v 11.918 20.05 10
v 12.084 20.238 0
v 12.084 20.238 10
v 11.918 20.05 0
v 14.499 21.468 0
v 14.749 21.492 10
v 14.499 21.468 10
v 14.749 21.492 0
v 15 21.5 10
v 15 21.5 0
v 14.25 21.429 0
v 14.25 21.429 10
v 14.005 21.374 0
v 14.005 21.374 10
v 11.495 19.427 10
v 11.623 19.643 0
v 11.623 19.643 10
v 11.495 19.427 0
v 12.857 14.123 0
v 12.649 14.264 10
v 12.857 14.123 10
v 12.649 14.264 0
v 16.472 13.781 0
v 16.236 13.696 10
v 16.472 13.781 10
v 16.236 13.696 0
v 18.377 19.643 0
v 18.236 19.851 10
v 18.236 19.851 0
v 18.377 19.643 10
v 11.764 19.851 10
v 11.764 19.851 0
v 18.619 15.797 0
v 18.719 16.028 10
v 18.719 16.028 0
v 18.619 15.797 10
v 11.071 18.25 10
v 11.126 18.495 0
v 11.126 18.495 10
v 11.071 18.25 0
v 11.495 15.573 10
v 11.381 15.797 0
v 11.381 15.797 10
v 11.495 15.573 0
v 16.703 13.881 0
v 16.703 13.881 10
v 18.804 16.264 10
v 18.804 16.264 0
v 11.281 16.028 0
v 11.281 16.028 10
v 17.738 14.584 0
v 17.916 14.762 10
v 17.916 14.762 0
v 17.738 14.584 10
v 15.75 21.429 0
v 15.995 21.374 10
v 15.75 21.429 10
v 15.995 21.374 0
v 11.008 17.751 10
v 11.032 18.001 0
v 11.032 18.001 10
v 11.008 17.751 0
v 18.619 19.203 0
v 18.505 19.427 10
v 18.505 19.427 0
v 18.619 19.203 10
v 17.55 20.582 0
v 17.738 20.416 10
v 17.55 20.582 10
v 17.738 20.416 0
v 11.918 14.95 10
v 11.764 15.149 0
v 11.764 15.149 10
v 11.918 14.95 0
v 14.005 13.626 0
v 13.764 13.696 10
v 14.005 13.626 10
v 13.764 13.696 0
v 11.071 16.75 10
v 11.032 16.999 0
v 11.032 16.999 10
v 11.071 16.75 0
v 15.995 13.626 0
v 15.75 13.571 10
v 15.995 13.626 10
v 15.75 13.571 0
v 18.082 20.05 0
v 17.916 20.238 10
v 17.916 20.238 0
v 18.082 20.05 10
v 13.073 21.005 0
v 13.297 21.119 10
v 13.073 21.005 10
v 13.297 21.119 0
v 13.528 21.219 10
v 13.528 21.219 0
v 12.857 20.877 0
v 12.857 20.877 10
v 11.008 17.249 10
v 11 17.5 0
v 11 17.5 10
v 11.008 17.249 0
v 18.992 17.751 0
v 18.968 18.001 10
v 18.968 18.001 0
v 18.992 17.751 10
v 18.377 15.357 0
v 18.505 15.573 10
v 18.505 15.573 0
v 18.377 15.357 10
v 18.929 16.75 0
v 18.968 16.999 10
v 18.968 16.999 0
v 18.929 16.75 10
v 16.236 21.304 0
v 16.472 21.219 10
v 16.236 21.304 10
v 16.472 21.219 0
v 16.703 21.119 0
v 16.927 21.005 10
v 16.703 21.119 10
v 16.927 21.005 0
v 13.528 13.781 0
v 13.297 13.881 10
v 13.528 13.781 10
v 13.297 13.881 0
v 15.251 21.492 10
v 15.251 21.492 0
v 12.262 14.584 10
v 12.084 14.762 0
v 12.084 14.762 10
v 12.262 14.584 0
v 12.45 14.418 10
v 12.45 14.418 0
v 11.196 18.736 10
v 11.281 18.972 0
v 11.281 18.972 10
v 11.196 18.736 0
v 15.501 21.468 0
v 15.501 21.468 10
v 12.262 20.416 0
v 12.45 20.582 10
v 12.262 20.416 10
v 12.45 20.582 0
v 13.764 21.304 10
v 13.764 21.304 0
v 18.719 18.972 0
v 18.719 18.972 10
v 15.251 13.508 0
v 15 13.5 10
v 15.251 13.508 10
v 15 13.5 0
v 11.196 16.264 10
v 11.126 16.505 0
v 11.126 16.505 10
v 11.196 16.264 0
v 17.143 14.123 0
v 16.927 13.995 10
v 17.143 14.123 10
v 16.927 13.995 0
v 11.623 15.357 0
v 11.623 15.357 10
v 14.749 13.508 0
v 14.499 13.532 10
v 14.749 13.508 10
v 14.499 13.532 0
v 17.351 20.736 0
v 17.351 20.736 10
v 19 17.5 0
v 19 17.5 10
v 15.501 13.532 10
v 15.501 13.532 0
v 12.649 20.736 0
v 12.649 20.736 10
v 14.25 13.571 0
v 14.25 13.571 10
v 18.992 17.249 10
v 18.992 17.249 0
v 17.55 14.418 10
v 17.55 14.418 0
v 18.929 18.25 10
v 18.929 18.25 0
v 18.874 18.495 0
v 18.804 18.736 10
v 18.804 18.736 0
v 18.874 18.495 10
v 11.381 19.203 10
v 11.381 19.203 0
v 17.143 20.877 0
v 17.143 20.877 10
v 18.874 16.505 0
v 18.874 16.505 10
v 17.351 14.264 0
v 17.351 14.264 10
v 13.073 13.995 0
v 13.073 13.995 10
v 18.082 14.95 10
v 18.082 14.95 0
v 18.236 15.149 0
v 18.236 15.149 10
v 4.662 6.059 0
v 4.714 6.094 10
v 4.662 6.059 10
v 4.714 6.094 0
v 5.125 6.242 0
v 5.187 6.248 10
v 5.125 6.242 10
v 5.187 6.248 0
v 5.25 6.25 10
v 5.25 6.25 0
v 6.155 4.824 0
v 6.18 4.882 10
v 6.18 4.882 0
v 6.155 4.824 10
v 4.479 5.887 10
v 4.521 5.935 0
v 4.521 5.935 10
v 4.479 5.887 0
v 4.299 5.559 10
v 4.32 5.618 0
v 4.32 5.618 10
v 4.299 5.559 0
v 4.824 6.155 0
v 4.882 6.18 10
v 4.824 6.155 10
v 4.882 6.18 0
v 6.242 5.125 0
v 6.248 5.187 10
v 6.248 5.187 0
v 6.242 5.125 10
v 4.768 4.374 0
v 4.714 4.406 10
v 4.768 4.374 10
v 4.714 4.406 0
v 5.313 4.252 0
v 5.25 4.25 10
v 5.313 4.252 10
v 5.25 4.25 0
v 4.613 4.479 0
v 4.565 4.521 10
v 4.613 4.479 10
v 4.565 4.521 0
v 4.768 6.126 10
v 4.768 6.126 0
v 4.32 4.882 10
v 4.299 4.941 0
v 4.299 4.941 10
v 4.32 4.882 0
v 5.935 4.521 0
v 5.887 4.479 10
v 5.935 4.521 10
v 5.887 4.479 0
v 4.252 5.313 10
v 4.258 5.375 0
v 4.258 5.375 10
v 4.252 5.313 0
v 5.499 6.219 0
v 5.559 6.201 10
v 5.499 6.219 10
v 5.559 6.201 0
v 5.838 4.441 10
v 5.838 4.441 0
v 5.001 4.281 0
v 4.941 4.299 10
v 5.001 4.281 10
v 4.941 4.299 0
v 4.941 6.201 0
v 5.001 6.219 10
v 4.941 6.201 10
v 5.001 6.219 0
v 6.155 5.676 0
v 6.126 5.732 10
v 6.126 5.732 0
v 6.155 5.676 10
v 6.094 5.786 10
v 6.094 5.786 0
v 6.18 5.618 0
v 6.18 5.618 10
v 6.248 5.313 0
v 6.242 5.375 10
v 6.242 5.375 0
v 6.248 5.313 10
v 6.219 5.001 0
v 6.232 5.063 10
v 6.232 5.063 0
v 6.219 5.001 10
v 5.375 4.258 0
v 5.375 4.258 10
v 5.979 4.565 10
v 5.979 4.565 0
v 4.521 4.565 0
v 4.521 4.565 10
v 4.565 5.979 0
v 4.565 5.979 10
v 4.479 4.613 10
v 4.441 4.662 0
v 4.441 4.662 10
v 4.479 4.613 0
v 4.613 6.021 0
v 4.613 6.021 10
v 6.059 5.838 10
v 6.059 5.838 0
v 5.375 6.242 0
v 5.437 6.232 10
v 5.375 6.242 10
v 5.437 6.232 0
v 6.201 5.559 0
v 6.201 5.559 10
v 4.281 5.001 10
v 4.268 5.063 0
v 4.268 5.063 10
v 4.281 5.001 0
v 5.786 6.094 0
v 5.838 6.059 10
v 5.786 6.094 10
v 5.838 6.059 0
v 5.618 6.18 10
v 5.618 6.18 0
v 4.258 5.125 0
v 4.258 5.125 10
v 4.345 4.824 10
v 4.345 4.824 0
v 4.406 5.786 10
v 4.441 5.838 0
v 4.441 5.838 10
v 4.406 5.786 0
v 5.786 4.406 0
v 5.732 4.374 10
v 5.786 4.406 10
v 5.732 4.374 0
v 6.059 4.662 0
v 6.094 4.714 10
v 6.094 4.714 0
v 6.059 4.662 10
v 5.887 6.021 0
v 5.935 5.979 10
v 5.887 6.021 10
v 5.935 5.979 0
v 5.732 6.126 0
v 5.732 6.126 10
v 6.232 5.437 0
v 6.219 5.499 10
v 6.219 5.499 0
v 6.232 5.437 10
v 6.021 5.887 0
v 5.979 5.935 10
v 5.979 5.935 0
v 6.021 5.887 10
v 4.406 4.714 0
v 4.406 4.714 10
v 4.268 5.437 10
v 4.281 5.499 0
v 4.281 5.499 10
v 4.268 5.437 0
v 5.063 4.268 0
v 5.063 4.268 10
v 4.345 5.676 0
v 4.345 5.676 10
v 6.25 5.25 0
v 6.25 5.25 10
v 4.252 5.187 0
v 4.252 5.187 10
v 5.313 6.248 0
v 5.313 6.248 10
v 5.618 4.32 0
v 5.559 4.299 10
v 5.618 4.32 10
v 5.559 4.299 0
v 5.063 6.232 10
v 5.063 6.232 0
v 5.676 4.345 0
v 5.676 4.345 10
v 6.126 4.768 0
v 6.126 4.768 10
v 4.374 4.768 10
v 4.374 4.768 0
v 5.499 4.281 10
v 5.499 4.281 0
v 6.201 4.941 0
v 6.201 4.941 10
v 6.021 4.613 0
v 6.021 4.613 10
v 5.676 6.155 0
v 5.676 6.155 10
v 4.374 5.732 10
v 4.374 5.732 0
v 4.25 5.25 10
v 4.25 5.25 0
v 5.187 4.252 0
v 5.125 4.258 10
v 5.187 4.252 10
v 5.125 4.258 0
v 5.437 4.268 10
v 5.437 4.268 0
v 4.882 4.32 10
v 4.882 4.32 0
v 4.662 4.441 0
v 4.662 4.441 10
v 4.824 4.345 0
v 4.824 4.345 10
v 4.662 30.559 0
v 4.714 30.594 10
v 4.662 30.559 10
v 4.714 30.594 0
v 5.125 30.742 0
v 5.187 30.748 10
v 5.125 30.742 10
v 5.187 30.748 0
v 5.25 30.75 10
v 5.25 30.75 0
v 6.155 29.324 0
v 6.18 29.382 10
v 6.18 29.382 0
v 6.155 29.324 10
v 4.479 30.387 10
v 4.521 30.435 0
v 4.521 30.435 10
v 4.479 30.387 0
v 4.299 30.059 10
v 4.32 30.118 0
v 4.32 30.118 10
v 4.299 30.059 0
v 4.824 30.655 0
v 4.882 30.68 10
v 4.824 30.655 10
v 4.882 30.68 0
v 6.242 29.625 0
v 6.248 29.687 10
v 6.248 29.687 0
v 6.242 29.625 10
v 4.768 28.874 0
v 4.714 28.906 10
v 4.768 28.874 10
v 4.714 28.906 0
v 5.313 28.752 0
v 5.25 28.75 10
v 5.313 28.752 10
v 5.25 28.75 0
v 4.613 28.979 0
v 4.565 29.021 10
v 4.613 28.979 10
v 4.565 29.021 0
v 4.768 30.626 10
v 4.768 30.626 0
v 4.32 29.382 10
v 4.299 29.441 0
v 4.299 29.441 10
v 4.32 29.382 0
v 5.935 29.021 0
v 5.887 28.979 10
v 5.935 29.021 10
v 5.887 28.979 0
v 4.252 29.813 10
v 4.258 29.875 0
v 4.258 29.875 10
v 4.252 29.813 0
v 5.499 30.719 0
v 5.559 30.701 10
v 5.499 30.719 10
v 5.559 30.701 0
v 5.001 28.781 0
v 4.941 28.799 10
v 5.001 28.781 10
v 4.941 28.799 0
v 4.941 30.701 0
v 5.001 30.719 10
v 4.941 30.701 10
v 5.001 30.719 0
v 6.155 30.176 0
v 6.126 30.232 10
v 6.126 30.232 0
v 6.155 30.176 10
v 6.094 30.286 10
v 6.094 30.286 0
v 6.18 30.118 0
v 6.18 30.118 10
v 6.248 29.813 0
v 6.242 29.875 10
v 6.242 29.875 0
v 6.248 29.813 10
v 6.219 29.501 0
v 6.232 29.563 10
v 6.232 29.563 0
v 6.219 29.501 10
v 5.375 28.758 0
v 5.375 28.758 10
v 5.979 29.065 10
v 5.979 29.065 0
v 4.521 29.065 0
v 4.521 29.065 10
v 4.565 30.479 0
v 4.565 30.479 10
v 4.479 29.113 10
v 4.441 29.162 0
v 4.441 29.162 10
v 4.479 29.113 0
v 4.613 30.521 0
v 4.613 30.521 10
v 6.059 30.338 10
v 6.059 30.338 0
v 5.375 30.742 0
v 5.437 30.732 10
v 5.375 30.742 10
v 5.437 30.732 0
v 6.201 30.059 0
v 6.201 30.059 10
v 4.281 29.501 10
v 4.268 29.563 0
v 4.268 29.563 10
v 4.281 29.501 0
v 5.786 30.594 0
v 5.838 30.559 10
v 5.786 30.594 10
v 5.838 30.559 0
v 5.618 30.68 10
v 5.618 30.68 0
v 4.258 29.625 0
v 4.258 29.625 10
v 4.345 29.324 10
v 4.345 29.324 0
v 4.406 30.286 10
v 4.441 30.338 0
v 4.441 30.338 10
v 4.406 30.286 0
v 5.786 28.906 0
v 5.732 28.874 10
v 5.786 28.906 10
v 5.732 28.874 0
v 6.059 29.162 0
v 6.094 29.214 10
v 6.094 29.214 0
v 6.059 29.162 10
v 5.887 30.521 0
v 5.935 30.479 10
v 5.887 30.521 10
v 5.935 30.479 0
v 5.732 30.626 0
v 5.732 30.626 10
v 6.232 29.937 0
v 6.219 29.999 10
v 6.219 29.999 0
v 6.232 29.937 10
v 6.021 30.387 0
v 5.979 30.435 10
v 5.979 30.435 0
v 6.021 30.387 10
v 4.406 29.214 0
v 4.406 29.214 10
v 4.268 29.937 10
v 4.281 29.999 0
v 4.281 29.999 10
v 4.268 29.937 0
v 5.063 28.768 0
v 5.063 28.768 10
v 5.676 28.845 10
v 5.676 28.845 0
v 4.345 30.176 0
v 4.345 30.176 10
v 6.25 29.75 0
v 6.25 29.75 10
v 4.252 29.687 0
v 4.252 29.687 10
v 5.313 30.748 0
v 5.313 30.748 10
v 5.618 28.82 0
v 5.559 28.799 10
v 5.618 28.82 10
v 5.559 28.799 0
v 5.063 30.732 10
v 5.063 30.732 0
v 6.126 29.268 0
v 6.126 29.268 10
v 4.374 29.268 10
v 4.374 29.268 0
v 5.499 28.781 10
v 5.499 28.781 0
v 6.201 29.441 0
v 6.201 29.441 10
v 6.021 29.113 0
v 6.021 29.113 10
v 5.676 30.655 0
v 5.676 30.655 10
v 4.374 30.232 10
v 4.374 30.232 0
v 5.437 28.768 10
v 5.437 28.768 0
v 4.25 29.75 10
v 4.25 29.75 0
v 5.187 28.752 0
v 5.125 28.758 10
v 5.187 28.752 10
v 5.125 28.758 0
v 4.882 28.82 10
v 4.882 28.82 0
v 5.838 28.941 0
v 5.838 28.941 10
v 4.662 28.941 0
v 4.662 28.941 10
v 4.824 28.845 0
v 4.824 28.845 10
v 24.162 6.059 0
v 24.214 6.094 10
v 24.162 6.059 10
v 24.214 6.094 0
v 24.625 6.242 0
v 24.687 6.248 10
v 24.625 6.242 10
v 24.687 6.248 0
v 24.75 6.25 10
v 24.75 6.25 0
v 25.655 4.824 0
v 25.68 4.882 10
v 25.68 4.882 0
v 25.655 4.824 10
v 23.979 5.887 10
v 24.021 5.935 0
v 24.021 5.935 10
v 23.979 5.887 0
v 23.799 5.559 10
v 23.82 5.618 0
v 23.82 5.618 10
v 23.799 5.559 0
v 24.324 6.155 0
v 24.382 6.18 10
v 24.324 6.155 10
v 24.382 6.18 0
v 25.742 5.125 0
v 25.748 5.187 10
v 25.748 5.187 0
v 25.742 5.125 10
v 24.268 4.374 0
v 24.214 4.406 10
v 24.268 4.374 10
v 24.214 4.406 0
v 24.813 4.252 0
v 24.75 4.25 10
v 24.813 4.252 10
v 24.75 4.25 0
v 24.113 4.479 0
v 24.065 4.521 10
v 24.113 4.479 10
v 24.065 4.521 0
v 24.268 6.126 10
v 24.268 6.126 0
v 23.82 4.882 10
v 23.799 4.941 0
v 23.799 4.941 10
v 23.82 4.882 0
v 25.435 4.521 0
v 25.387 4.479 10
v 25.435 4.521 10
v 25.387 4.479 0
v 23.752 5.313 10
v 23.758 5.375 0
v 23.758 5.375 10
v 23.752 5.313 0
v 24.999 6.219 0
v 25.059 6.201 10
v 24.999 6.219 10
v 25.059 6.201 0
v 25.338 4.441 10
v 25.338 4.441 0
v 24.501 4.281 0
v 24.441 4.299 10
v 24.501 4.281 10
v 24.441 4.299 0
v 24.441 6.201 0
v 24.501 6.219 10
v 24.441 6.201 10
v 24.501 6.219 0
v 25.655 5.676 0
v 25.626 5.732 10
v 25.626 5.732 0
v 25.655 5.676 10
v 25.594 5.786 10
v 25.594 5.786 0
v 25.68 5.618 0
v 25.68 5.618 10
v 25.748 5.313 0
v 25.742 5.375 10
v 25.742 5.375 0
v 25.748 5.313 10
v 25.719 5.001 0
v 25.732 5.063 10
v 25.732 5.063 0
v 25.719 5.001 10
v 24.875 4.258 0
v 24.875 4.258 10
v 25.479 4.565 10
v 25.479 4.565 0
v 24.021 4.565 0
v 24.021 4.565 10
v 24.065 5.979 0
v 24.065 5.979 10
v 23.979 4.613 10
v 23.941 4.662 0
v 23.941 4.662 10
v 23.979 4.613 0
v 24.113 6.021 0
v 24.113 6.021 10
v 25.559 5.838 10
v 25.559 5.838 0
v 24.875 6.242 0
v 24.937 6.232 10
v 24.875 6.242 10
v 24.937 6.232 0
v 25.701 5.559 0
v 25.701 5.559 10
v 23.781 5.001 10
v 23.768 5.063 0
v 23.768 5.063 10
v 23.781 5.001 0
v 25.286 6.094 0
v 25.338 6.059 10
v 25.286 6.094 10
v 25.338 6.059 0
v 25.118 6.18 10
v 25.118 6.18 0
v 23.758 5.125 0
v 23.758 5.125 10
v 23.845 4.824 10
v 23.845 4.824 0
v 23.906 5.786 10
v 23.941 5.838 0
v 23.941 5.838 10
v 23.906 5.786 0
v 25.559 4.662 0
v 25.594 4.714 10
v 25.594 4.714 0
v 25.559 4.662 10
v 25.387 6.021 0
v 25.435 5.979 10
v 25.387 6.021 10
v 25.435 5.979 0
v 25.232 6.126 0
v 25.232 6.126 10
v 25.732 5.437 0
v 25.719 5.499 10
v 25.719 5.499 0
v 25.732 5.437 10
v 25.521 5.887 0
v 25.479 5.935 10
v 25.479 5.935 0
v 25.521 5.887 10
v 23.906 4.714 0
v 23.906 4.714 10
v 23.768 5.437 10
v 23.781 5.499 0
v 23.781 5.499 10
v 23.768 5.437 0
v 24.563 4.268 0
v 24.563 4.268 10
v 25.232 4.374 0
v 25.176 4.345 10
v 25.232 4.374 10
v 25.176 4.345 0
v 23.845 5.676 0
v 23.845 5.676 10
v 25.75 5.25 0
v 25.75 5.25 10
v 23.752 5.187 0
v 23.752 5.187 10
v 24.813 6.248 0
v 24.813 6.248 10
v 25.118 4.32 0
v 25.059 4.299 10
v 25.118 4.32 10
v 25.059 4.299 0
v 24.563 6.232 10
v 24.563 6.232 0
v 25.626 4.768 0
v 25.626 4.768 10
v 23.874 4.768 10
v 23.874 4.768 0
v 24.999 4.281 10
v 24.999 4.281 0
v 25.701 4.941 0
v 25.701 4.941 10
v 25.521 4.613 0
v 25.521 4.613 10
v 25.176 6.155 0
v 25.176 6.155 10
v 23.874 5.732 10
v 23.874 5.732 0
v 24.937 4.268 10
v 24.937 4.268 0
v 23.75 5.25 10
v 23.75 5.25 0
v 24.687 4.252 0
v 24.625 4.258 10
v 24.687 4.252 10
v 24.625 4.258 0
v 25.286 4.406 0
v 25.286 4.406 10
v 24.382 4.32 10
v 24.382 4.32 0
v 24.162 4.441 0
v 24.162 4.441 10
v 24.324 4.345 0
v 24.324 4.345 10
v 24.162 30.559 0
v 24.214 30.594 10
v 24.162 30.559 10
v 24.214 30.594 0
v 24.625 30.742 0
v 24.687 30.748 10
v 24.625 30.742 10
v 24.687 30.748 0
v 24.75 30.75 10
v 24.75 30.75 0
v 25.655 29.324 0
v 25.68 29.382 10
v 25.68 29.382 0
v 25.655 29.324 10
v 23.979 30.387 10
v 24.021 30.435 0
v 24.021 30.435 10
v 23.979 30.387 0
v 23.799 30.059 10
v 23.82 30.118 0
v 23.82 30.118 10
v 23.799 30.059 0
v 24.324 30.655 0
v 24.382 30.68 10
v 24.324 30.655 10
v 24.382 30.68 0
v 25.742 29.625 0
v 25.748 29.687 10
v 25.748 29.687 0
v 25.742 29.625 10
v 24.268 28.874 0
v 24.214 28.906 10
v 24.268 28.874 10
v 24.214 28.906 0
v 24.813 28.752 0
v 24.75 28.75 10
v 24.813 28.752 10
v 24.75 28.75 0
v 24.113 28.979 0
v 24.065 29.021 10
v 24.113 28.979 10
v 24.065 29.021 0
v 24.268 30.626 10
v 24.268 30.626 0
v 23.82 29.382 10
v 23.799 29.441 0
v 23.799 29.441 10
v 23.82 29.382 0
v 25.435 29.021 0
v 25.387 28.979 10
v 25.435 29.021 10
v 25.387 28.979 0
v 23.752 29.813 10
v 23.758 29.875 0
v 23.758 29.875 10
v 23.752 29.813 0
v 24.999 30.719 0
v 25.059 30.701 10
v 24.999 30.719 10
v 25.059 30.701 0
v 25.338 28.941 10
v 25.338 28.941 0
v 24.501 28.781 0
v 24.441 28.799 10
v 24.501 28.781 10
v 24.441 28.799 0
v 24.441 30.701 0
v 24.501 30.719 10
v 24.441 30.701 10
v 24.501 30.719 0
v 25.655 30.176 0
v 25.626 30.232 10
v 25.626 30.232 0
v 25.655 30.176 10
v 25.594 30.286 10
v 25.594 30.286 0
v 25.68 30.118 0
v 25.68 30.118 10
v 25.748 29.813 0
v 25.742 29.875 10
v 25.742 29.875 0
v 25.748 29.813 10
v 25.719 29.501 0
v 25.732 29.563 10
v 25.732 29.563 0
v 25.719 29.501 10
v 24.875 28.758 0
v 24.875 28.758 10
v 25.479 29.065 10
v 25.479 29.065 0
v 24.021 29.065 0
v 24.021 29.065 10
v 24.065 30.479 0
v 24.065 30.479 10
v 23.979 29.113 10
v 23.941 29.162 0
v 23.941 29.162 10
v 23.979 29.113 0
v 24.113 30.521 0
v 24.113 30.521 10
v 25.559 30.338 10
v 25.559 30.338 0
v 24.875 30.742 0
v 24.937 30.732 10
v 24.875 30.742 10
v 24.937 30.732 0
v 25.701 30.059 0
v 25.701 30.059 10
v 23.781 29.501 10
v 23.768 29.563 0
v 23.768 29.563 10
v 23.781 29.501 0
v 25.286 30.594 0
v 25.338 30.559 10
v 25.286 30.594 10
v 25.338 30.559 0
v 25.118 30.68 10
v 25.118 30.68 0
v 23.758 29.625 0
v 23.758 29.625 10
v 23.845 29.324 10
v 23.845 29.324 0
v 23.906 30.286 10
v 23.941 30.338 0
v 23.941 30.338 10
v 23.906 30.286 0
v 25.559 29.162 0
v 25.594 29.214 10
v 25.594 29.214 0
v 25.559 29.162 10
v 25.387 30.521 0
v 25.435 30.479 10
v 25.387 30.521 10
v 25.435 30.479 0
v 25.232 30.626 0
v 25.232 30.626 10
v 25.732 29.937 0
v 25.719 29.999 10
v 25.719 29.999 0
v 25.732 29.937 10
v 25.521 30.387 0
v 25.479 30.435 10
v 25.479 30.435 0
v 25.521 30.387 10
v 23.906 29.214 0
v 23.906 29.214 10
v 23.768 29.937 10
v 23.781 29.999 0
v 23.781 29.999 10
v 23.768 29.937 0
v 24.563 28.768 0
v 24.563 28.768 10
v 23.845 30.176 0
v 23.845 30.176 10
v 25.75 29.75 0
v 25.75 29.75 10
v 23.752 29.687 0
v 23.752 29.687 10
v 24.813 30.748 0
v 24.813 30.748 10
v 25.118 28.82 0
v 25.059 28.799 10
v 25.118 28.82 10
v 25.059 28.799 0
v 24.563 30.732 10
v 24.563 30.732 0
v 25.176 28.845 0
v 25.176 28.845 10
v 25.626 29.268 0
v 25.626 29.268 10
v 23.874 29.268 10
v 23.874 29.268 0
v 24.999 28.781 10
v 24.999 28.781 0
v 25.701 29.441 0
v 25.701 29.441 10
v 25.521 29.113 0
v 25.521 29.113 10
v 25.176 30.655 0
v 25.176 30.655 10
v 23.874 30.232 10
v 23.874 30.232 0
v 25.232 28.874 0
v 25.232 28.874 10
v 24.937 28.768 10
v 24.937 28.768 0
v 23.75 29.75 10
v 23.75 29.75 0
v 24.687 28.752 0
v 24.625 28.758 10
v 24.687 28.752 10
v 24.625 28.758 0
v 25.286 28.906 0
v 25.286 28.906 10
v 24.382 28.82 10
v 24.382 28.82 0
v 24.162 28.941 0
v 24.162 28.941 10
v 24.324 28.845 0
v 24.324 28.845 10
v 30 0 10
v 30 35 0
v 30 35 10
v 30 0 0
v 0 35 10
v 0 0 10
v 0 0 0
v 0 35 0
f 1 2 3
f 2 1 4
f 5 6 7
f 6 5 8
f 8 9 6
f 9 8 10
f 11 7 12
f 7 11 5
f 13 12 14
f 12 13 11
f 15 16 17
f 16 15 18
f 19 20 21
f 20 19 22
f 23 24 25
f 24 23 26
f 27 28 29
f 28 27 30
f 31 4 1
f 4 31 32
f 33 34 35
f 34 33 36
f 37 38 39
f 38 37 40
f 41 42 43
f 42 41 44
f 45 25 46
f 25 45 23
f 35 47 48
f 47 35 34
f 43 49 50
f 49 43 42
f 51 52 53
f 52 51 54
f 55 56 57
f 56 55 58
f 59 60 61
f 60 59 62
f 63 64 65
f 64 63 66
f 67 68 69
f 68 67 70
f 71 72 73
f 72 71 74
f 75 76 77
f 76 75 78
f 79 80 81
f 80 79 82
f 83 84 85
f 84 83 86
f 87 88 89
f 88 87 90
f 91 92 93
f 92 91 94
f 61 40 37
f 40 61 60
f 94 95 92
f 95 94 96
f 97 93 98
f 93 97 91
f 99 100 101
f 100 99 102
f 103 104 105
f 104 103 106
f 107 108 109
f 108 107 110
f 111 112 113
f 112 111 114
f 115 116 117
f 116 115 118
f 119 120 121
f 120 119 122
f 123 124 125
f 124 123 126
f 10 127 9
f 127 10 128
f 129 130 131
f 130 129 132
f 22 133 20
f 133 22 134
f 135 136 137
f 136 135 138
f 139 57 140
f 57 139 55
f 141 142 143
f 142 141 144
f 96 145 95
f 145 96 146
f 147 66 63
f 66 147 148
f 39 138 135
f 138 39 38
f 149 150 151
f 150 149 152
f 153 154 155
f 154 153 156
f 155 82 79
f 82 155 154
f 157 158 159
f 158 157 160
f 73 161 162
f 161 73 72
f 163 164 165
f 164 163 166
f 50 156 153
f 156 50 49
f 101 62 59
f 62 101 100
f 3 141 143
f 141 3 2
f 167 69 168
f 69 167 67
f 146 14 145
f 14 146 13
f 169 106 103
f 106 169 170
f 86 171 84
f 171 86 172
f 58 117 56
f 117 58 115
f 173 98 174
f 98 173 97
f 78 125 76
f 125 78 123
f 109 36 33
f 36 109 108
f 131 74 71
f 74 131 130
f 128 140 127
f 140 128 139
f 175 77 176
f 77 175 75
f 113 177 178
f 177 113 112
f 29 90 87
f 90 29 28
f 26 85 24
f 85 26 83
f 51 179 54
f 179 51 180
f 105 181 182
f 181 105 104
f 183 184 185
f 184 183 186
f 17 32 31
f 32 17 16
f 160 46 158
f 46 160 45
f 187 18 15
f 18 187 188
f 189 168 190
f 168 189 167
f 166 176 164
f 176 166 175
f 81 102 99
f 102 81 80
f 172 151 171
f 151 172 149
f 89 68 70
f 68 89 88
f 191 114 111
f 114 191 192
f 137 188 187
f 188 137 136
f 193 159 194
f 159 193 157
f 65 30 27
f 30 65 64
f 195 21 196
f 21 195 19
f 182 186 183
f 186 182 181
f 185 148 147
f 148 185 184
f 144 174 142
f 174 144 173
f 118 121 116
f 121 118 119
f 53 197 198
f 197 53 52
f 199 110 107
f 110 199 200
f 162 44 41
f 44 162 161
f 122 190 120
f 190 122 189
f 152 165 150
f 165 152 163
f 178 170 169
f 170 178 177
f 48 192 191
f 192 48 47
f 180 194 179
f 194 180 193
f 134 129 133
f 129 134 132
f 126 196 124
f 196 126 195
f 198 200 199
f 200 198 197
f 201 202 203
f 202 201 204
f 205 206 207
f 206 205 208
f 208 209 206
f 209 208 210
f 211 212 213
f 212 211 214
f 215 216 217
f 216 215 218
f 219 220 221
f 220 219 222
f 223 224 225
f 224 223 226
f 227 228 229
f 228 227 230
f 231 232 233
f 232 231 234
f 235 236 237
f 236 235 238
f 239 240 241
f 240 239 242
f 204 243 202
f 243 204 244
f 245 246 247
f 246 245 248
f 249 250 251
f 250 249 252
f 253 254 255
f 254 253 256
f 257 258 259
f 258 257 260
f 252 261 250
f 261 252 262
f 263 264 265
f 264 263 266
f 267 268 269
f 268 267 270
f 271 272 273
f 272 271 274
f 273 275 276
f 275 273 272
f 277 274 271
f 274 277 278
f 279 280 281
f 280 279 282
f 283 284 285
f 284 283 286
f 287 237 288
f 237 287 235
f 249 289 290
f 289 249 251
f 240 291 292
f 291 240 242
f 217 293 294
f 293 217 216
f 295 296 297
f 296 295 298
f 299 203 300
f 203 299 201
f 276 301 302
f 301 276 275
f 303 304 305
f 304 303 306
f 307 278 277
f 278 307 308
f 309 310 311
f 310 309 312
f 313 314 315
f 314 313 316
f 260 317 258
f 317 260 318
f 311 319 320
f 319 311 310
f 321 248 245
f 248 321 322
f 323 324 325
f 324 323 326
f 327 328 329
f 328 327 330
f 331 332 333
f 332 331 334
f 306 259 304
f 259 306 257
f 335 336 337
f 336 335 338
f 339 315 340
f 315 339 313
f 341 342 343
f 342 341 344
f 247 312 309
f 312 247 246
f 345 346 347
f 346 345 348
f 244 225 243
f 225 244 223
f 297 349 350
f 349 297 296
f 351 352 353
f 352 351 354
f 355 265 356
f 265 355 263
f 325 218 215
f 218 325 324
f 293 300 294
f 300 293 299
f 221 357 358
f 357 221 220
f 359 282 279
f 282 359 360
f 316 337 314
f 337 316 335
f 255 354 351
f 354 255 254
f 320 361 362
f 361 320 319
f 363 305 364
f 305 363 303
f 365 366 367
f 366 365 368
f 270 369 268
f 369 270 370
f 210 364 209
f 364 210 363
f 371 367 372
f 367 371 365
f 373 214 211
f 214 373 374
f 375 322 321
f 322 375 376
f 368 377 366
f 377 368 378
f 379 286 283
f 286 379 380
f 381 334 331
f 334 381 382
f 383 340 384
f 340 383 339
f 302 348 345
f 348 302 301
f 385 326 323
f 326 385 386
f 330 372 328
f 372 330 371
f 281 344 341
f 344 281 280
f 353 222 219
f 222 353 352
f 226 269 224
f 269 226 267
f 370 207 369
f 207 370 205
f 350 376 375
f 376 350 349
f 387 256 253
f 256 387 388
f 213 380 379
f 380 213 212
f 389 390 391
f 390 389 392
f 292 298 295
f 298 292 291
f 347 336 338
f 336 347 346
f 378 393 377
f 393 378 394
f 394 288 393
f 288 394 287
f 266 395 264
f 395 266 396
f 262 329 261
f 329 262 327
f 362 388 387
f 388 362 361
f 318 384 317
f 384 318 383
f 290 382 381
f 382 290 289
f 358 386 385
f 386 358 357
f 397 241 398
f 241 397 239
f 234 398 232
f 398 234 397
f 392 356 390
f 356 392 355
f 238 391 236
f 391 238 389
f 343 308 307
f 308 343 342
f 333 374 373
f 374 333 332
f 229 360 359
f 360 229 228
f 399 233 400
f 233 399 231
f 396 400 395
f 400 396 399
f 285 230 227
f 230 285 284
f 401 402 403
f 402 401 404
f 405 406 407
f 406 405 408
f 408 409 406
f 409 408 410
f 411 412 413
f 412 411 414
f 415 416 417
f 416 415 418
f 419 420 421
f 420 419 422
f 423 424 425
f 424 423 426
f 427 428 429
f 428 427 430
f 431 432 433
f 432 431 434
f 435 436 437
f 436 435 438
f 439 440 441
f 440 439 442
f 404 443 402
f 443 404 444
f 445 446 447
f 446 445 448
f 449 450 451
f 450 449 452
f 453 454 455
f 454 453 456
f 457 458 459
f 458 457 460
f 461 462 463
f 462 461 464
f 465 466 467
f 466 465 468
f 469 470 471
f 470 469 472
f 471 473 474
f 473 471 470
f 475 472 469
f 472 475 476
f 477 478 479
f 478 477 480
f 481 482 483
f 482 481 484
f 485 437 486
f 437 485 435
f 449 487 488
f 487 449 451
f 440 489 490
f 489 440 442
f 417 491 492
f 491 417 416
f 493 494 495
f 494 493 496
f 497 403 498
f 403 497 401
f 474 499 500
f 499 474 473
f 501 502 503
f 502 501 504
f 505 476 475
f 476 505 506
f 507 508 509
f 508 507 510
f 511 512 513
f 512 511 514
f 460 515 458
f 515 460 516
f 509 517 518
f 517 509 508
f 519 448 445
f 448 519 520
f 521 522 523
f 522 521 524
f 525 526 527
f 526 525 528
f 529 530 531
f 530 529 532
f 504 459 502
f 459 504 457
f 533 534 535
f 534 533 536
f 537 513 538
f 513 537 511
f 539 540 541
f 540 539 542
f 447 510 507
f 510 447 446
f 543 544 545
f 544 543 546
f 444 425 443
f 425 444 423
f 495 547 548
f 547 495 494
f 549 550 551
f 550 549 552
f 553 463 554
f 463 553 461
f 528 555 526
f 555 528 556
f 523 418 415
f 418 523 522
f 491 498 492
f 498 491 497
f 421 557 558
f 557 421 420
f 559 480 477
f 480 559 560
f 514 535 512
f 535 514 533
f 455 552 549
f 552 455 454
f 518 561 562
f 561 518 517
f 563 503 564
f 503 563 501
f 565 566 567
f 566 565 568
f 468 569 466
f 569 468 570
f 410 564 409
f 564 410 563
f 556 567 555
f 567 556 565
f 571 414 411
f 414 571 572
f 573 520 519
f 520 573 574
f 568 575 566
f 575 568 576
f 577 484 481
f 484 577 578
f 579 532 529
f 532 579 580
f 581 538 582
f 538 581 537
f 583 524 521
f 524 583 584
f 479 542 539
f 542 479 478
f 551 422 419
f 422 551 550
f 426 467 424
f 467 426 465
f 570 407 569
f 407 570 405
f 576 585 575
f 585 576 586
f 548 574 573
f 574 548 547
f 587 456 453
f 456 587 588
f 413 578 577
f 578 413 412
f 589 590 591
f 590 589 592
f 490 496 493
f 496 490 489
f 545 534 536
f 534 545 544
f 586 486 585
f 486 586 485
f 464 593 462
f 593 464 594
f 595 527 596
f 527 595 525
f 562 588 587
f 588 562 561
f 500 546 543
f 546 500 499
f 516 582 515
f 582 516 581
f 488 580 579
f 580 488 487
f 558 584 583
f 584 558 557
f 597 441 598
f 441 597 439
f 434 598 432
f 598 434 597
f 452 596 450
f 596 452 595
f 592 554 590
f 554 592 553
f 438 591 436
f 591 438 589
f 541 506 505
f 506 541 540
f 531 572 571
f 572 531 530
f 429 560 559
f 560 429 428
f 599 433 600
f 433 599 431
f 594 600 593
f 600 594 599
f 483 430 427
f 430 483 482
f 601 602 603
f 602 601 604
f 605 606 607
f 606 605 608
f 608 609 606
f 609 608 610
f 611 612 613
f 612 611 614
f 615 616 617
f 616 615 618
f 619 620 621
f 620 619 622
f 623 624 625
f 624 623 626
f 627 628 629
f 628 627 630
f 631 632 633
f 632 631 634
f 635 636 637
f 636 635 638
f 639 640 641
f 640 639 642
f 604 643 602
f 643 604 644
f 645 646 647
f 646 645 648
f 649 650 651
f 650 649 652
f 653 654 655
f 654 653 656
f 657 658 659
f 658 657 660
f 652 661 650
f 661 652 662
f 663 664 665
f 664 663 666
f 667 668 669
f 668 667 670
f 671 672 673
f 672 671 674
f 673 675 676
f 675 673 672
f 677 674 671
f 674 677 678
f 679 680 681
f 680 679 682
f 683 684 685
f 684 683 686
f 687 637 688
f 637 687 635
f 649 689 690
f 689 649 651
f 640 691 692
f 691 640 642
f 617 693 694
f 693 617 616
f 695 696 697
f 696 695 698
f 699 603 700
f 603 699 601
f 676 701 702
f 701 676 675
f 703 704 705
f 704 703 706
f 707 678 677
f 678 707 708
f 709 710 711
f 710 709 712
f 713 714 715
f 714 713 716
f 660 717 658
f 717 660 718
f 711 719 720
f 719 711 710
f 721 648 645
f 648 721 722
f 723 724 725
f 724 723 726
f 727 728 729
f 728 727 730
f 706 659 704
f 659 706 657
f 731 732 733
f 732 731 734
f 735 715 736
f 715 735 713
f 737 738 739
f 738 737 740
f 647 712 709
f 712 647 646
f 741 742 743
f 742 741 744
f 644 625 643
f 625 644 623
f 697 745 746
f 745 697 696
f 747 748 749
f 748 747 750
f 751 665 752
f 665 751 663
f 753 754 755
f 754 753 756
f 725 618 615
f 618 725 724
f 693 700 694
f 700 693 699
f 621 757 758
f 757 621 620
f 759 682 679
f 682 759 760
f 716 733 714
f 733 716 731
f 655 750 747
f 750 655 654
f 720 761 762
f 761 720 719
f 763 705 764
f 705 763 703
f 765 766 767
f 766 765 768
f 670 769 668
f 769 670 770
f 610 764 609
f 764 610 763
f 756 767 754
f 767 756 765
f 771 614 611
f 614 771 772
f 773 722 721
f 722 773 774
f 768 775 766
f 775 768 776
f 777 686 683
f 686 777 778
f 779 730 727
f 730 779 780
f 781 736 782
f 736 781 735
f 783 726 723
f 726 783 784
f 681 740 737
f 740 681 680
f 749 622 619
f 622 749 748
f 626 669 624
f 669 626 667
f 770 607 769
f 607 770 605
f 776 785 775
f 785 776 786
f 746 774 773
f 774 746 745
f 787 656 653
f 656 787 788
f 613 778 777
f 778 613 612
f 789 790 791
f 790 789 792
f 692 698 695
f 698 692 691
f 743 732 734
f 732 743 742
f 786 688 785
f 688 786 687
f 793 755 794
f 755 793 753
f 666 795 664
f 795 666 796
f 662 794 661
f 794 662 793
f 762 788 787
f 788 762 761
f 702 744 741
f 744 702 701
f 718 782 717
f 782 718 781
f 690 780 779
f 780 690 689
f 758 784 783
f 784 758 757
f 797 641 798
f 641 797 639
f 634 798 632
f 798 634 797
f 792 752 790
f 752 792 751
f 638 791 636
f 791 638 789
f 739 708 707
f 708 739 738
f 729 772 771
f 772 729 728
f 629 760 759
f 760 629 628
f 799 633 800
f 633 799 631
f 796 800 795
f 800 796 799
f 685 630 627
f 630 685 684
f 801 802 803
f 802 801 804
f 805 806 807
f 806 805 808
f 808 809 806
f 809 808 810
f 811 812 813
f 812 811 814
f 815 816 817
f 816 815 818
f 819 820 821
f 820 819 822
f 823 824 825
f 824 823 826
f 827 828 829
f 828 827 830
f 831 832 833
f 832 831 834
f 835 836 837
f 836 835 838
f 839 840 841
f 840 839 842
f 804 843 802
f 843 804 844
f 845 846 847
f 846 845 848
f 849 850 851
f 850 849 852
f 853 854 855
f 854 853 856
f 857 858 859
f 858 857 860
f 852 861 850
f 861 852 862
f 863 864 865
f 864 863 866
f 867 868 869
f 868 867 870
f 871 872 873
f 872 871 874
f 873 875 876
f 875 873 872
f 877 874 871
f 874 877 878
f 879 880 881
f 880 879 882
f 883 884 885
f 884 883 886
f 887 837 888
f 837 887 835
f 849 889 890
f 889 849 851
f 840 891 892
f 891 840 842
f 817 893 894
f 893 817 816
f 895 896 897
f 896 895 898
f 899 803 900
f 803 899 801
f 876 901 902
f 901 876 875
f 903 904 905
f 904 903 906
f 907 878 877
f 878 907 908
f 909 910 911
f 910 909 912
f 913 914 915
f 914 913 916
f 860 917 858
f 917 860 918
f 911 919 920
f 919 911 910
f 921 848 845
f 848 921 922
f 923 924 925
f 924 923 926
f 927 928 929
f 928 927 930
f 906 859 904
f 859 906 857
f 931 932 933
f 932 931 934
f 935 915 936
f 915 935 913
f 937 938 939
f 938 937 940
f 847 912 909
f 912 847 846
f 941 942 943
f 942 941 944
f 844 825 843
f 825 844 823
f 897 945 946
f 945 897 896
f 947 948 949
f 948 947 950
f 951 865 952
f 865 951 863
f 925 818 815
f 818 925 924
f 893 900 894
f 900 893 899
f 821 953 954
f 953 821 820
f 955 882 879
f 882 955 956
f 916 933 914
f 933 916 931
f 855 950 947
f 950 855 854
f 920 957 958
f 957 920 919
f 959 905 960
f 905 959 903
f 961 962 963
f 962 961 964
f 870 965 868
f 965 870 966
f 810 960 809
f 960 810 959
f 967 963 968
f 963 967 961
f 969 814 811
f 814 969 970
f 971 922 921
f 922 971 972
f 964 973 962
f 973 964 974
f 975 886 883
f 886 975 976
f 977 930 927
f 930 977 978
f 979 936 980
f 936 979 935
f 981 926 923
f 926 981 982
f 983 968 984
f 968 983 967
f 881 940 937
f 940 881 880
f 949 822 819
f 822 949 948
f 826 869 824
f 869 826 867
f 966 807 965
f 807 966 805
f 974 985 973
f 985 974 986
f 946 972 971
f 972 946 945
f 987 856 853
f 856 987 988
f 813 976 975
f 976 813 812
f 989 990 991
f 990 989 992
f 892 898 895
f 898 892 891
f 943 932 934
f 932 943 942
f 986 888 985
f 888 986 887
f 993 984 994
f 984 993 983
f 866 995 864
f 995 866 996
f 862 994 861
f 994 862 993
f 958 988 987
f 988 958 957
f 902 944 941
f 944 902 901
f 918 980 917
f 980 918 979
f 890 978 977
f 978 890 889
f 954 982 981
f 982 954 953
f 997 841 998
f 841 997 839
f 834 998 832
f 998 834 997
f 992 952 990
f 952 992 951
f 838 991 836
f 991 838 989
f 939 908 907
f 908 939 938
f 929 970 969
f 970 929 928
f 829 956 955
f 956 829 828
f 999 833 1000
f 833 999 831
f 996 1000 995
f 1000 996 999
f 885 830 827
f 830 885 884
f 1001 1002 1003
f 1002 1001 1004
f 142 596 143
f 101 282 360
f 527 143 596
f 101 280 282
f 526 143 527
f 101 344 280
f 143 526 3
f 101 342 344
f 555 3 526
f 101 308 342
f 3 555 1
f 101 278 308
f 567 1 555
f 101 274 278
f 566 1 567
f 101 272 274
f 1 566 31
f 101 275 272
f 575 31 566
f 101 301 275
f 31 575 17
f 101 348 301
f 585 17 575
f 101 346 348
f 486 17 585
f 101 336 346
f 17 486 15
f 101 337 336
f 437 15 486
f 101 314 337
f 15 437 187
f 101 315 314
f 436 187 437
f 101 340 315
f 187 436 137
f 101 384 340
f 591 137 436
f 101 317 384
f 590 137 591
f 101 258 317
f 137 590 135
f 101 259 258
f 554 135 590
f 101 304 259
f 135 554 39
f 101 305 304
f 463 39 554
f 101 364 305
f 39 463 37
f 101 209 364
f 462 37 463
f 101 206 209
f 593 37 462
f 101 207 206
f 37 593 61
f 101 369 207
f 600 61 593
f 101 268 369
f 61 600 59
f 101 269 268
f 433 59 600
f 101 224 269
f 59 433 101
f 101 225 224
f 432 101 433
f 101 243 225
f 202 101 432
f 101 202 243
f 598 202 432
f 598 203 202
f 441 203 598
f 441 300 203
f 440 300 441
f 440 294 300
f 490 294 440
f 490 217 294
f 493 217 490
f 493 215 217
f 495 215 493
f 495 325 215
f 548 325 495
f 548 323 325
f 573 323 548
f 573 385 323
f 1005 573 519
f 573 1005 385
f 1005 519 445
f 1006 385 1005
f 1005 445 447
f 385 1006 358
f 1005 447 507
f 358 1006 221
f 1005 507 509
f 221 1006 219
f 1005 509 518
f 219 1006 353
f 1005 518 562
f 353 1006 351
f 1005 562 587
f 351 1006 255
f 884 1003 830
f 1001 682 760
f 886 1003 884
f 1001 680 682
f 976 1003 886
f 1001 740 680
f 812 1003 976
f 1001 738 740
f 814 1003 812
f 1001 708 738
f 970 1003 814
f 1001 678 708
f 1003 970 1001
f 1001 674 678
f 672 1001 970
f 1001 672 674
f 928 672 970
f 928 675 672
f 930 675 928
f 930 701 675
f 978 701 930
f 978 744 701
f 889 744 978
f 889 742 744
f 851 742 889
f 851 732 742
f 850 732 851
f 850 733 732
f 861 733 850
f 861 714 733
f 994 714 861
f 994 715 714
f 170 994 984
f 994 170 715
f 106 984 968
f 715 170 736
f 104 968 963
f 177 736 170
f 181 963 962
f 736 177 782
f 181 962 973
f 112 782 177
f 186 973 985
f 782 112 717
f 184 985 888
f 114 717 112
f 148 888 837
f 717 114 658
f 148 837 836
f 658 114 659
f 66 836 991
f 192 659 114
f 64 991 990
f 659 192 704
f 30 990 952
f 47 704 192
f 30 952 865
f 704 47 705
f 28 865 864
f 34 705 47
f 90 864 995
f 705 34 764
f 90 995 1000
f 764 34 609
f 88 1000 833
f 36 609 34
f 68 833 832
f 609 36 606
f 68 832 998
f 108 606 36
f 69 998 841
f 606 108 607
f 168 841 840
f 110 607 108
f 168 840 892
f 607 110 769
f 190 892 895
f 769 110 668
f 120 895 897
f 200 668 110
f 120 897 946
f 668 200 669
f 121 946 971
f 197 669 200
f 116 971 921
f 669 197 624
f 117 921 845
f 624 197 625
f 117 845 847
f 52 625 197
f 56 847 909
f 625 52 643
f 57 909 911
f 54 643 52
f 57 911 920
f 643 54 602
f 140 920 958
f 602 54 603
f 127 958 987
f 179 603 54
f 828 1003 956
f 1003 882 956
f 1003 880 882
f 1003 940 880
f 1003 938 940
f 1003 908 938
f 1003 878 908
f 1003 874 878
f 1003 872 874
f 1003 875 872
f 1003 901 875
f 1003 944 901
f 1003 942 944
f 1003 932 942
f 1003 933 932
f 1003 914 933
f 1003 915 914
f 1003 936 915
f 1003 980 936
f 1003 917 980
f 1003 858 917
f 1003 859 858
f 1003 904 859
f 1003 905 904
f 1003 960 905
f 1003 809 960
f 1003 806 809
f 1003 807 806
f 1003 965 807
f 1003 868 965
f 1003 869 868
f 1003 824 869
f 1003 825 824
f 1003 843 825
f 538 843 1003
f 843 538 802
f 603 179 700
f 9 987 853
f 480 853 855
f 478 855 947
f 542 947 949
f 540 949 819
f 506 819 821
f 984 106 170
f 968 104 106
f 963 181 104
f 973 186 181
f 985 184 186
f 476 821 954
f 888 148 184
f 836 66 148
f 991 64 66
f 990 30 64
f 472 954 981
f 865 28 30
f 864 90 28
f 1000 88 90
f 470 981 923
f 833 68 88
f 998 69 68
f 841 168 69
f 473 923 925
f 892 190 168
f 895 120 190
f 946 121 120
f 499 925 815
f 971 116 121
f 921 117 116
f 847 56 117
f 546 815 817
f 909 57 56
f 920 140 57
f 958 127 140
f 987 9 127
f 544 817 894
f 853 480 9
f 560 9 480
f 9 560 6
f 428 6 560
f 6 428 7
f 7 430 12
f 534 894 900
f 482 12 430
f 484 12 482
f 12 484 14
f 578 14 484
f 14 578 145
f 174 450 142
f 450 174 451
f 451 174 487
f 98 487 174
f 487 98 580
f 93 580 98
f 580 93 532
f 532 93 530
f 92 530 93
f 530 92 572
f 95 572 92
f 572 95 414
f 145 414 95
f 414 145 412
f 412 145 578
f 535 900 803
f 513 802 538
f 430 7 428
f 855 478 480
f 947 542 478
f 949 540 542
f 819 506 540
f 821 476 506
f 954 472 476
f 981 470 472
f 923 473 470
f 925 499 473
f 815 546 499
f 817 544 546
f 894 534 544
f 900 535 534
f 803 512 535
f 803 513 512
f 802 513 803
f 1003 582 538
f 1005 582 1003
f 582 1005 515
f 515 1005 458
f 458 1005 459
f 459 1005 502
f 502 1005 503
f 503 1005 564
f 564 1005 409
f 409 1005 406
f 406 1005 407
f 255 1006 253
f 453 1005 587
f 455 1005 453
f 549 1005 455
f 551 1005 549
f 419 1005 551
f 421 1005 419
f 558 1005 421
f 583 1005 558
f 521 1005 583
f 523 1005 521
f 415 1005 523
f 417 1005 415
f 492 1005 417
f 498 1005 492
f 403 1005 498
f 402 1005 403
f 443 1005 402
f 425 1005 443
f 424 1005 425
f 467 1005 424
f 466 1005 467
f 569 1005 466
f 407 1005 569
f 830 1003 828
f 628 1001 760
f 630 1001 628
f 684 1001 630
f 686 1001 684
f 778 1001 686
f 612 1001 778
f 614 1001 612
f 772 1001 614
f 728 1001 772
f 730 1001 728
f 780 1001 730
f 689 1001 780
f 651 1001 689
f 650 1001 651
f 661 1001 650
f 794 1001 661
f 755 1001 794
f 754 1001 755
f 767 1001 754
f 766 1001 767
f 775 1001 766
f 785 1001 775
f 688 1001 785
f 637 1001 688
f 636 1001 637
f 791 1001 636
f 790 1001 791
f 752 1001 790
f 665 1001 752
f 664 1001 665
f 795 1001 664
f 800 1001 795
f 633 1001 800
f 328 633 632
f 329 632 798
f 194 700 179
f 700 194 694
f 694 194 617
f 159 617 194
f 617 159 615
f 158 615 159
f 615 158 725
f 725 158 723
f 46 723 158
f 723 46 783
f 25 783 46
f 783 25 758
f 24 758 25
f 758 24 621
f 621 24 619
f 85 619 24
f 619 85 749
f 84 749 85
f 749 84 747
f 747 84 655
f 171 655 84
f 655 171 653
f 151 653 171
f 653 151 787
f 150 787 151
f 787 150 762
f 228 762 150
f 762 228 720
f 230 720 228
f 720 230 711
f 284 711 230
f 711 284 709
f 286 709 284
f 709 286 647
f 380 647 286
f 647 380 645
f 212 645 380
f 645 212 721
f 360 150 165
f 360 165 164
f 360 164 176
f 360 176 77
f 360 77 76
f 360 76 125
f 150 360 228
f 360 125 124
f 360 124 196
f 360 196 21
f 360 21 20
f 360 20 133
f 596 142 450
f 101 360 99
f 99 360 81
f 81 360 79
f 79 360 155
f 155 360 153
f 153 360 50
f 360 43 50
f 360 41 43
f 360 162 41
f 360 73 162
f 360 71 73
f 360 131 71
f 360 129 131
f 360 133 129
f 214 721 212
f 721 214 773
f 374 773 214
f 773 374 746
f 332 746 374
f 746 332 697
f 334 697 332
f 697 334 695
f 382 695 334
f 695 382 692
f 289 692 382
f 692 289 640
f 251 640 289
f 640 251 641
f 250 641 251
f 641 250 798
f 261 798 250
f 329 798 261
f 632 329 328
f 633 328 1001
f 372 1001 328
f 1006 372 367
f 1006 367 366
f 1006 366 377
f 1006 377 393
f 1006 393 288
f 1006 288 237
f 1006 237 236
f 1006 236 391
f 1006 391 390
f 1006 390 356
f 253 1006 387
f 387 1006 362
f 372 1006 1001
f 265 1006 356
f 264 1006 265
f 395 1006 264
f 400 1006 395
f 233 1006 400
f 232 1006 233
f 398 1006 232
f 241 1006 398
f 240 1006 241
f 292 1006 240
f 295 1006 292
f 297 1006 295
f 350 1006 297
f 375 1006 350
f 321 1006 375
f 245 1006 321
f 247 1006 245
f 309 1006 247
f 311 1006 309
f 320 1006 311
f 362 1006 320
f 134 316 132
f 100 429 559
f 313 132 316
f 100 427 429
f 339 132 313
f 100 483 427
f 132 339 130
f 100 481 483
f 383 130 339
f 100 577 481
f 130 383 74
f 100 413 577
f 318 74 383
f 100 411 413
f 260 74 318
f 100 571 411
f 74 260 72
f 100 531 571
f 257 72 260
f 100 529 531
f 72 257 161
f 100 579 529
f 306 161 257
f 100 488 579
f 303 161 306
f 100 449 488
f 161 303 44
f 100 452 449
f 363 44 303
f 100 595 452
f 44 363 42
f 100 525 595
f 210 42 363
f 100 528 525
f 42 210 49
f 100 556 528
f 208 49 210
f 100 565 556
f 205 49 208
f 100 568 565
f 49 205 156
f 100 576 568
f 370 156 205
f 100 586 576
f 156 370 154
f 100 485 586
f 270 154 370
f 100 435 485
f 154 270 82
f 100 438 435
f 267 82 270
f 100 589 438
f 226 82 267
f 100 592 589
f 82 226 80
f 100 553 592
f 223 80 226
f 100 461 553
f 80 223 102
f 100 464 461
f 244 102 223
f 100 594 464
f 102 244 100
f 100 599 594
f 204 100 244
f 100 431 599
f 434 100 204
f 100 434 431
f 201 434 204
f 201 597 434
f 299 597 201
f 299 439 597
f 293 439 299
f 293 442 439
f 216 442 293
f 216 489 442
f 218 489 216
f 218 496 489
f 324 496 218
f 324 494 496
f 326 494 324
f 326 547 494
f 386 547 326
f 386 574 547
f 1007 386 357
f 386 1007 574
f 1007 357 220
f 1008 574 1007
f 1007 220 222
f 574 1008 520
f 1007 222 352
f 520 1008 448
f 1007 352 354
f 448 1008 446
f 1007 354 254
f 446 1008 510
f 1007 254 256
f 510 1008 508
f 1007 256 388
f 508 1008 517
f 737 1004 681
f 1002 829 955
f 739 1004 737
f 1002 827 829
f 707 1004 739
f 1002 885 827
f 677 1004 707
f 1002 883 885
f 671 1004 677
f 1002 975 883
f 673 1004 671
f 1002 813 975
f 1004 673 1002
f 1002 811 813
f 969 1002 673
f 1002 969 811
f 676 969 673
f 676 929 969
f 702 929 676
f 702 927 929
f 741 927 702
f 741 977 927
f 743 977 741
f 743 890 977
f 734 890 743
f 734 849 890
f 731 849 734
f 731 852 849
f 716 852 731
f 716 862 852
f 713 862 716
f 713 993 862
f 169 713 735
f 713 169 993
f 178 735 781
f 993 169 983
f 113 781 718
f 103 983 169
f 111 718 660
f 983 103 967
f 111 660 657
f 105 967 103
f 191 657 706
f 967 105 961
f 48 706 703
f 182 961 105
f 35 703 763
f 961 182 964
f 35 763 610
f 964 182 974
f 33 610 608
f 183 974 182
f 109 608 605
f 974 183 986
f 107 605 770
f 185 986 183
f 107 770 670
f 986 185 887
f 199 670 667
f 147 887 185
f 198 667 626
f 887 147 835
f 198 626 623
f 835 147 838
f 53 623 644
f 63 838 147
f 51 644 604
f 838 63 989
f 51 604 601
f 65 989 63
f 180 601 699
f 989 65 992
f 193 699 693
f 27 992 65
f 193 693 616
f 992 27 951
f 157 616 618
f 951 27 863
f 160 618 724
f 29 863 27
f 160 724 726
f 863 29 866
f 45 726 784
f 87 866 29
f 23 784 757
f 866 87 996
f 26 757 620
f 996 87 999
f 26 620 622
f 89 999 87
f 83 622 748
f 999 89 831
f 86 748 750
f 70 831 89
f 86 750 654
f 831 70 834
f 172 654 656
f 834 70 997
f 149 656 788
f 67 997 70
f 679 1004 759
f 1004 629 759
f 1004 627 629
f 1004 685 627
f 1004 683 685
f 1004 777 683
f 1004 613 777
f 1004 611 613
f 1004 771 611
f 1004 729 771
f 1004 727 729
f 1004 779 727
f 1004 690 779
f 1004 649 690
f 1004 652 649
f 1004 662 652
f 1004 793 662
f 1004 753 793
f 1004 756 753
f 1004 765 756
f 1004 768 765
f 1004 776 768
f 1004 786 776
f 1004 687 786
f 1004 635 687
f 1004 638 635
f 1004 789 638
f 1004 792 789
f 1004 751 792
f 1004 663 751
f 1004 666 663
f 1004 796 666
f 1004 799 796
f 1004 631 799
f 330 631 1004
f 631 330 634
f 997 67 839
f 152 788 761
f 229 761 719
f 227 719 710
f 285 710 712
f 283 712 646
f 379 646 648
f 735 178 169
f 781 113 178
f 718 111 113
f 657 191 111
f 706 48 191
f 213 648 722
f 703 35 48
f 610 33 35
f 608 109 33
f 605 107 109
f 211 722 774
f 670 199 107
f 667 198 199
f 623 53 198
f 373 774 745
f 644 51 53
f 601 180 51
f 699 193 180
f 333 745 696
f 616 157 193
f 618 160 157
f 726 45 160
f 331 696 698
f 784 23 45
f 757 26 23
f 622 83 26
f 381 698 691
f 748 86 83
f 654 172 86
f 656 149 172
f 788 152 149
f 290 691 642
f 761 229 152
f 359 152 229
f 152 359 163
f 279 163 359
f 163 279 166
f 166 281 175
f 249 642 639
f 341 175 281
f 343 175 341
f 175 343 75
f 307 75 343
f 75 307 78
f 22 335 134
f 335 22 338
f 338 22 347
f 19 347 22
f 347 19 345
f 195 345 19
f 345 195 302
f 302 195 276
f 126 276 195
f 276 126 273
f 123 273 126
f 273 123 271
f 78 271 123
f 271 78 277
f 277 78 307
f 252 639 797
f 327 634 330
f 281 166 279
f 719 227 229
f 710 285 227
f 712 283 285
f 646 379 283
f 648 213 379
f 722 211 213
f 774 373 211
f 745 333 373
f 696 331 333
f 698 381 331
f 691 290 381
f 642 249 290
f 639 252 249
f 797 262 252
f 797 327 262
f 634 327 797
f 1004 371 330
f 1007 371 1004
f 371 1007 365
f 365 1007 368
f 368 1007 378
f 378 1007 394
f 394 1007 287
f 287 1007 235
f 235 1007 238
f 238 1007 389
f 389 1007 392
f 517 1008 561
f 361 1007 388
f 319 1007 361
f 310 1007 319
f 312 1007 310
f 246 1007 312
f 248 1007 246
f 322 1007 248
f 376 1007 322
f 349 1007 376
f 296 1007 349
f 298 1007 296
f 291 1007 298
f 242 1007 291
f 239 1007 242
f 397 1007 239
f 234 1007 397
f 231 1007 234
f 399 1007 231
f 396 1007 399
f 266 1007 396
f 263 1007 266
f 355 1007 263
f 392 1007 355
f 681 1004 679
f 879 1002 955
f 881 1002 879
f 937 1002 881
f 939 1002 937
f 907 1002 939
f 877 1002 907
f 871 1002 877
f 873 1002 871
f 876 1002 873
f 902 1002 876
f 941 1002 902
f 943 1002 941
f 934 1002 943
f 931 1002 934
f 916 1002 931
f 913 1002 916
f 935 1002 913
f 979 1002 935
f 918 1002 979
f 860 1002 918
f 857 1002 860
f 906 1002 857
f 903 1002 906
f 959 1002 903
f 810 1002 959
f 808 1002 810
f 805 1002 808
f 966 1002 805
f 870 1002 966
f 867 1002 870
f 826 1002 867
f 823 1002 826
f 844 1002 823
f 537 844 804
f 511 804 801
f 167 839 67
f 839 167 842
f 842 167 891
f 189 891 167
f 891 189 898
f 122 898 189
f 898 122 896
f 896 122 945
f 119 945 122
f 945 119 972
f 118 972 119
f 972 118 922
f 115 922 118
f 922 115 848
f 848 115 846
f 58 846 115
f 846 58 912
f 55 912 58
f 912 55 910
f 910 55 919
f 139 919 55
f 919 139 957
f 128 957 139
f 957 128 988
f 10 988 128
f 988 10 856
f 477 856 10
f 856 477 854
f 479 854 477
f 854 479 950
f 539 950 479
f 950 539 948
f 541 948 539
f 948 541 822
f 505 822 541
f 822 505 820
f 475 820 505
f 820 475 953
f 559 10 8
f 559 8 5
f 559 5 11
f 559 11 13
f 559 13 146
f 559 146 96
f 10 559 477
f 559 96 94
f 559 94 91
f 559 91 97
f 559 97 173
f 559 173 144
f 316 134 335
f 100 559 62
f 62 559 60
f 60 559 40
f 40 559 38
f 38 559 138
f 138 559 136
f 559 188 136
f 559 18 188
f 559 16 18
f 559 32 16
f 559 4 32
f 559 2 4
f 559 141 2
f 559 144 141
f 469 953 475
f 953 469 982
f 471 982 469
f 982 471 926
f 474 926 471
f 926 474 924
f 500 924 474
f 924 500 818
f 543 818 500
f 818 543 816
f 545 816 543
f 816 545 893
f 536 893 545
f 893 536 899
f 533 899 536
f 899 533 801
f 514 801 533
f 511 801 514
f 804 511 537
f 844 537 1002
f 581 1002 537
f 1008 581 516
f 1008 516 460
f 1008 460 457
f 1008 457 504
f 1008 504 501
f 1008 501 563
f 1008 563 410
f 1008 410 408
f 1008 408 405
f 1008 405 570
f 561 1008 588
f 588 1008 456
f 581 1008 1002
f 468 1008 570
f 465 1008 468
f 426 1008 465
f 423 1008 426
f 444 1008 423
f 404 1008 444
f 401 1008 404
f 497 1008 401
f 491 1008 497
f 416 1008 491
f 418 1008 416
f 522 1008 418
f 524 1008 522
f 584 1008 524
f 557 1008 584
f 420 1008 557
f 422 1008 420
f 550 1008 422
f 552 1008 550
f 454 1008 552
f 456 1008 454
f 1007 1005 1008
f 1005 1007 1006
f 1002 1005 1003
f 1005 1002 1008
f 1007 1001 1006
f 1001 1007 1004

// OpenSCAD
difference(){
	union(){ 

        translate([0,0,0]){
           cube([30,35,10], center=false);
        }                
	}
	union() {
        translate([15,17.5,15]){
            rotate([0,0,90]){
                cylinder(h=200, r=4, $fn=100, center=true);
            }   
        }
        translate([5.25,5.25,0]){
            rotate([0,0,90]){
                cylinder(h=200, r=1, $fn=100, center=true);
            }   
        }
        translate([5.25,35-5.25,0]){
            rotate([0,0,90]){
                cylinder(h=200, r=1, $fn=100, center=true);
            }   
        }
        translate([30-5.25,5.25,0]){
            rotate([0,0,90]){
                cylinder(h=200, r=1, $fn=100, center=true);
            }   
        }
        translate([30-5.25,35-5.25,0]){
            rotate([0,0,90]){
                cylinder(h=200, r=1, $fn=100, center=true);
            }   
        }
	}
}
